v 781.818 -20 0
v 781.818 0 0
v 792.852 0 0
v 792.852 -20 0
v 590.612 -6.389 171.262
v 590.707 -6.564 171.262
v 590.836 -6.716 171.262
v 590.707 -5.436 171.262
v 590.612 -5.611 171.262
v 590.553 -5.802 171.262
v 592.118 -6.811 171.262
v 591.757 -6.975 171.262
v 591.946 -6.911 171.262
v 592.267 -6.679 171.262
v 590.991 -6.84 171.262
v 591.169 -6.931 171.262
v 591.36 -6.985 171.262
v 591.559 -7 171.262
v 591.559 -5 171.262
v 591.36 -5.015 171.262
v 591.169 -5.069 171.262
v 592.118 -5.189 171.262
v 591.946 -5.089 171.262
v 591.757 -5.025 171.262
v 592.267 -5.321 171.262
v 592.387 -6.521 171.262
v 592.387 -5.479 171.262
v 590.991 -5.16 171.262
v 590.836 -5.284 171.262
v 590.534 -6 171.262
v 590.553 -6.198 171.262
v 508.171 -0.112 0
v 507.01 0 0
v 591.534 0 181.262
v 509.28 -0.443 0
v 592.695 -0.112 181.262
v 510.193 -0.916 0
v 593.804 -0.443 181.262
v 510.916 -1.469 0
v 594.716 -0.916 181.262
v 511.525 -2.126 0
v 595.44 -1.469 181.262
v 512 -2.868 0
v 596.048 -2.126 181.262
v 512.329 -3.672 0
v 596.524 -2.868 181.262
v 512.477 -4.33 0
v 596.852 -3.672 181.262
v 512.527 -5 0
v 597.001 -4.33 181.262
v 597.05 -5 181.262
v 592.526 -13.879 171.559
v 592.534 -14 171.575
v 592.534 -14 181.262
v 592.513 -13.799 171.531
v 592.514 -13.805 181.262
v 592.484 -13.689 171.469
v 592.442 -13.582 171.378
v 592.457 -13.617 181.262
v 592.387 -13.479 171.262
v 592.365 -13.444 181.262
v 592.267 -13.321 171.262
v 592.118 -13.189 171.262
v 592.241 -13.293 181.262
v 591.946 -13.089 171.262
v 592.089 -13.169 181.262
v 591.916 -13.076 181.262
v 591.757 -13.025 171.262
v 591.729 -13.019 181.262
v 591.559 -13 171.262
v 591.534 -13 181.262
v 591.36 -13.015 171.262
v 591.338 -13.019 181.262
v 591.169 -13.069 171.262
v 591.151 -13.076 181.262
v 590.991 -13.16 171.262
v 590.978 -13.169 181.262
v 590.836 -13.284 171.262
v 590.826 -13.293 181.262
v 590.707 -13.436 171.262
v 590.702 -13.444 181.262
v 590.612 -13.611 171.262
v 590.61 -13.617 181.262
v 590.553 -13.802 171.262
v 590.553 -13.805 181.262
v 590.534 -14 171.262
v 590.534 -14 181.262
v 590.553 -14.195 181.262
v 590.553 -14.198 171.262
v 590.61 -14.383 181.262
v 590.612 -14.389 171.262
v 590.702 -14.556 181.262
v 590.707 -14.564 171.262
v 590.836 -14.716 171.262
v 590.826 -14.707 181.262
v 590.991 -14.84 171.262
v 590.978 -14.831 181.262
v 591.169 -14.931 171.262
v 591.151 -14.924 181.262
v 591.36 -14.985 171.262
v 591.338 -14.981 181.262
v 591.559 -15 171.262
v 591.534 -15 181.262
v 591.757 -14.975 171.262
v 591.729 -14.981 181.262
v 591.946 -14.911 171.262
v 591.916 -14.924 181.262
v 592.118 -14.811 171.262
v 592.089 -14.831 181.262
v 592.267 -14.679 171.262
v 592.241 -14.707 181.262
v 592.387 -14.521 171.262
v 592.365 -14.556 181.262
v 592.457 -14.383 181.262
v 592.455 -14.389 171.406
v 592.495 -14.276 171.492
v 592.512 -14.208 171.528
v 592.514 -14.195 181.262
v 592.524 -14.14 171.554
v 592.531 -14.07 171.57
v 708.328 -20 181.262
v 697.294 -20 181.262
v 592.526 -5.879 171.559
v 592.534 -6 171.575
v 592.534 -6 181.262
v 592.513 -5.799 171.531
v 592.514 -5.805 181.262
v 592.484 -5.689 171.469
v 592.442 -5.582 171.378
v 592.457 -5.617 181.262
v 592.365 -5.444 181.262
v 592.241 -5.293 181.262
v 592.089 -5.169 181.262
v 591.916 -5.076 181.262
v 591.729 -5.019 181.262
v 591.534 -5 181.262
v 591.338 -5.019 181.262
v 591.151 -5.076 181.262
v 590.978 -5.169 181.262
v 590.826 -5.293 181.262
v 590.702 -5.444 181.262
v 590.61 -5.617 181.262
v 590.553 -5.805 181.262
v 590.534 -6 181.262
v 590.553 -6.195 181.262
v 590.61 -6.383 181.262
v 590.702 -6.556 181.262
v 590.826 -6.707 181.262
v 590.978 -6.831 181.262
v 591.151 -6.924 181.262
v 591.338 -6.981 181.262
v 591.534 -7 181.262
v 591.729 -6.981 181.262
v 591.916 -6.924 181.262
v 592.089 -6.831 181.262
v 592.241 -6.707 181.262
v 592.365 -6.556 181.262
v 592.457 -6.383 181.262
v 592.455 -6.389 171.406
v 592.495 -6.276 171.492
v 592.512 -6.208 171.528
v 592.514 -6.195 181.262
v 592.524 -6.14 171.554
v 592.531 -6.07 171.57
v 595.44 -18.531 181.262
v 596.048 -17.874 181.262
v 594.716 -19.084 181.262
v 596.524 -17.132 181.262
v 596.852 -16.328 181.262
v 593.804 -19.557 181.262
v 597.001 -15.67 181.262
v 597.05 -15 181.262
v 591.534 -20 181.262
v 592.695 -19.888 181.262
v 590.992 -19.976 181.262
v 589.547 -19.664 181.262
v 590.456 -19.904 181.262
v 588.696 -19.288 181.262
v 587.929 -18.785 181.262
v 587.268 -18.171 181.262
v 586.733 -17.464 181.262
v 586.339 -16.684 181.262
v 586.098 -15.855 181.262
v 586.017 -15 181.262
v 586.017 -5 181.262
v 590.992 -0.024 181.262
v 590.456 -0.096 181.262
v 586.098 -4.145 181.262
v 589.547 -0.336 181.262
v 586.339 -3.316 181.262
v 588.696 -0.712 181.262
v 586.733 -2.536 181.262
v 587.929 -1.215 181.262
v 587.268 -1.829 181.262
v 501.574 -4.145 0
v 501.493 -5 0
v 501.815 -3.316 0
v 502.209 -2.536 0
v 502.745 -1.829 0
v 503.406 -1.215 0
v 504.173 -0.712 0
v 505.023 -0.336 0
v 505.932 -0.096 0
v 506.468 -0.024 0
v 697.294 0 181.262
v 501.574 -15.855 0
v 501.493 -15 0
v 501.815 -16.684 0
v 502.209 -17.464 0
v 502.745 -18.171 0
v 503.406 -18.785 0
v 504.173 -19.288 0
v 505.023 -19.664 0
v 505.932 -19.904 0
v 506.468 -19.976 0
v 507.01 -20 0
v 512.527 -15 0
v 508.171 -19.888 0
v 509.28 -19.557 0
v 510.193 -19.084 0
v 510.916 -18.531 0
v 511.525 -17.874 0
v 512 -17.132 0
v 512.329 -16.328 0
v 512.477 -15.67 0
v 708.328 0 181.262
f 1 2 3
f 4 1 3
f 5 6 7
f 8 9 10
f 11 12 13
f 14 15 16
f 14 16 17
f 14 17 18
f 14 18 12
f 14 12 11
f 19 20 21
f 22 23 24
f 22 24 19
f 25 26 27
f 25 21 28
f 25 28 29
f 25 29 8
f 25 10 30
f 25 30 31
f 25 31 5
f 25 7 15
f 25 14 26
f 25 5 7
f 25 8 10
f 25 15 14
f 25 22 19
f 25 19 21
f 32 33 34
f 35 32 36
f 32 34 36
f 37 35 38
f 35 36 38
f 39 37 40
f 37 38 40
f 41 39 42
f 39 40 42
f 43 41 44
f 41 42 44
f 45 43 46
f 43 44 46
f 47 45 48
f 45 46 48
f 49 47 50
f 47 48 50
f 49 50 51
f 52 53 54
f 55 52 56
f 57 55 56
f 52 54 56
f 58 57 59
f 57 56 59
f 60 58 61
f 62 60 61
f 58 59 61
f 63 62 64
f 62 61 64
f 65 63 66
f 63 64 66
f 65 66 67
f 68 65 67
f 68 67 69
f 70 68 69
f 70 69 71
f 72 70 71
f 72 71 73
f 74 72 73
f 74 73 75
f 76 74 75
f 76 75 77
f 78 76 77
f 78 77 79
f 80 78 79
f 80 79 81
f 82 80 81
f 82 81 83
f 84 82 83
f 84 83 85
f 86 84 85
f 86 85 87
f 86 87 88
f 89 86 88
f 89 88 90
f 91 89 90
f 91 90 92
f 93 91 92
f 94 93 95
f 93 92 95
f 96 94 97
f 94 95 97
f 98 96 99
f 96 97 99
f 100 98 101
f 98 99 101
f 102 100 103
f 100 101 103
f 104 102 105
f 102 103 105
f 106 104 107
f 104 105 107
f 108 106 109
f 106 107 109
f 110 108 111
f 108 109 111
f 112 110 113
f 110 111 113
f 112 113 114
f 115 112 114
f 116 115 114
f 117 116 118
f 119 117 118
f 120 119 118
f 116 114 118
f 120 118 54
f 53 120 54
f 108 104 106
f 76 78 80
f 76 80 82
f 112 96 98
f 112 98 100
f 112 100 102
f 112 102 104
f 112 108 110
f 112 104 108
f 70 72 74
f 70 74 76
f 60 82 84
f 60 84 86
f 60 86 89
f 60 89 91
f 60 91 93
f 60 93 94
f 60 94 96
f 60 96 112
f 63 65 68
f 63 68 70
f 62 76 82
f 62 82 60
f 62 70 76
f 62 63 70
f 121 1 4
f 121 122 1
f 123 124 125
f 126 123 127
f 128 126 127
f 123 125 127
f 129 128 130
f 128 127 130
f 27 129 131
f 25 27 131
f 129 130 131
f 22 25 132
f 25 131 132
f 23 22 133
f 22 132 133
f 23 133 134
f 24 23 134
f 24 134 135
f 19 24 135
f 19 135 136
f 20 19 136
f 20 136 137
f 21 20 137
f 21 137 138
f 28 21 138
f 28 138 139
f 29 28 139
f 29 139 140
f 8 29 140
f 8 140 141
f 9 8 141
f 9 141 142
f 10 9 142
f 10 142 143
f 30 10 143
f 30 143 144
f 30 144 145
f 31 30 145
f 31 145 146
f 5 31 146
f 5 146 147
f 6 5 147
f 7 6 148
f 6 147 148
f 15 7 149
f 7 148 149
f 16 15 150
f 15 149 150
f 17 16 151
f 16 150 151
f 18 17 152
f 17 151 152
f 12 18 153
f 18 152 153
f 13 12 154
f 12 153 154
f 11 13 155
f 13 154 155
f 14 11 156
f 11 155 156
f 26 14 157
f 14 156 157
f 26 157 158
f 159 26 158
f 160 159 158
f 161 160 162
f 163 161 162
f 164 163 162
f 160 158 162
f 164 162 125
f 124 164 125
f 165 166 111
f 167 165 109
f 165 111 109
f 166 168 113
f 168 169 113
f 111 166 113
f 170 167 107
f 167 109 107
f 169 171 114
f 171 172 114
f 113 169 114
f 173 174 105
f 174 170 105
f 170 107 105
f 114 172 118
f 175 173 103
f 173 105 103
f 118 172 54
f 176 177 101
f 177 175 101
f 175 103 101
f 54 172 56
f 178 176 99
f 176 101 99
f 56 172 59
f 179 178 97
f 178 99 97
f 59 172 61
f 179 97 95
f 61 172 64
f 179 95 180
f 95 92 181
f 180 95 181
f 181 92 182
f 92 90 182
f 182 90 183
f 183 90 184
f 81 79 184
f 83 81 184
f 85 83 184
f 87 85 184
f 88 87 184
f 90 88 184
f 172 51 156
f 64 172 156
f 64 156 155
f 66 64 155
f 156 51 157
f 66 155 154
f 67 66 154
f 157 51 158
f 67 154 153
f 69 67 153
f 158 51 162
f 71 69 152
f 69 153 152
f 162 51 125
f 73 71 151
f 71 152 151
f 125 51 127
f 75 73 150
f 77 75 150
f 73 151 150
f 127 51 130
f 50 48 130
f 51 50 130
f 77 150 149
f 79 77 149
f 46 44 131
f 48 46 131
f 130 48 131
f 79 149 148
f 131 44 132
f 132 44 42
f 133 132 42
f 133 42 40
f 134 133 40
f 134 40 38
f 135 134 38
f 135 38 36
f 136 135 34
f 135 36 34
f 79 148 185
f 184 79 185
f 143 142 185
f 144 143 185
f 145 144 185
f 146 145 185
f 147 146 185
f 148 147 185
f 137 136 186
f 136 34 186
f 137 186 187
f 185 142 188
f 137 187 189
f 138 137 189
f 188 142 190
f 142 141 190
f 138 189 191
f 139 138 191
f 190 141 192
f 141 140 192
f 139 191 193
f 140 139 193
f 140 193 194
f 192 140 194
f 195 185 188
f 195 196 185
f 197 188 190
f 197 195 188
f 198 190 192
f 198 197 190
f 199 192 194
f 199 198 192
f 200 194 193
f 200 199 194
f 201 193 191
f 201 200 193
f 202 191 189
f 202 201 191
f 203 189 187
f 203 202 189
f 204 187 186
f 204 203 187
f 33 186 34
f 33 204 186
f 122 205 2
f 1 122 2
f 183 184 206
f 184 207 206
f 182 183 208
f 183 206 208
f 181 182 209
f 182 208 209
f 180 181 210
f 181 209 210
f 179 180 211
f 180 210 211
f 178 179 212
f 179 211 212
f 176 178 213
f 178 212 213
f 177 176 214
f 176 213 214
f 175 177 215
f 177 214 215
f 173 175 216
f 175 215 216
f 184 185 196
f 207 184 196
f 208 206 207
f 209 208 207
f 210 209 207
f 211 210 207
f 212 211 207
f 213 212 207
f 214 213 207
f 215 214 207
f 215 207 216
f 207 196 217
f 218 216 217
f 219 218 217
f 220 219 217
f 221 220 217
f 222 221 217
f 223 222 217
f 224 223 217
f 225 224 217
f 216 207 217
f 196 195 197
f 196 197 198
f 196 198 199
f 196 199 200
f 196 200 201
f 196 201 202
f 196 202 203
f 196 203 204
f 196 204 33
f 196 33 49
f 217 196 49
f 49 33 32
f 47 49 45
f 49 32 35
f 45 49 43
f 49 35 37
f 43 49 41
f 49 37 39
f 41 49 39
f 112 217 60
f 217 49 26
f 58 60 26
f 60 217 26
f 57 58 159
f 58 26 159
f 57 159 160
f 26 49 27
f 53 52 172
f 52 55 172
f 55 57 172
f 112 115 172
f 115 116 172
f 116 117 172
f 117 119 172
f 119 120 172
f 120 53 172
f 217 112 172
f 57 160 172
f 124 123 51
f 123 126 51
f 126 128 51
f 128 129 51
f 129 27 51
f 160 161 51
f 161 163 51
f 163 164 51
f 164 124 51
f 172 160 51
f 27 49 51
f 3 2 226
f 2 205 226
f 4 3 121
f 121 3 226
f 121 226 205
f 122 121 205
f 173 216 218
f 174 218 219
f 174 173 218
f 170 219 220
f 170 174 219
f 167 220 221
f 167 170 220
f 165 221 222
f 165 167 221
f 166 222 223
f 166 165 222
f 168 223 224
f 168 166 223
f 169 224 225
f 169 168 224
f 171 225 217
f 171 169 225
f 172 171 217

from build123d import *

# Parameters (mm, degrees)
F1_DEPTH = 20
F2_R     = 1
F3_DEPTH = 10
F4_R     = 4.99999


# Not quite as in the source:
# - a fillet or chamfer is up to 0.001 mm smaller than in the source, because OpenCascade refuses the exact size


with BuildPart() as f1:
    # F0 (on Front) → F1 (new body)
    with BuildSketch(Plane.XZ):
        Polygon((586.0166443916, 181.2615574073), (501.4929920435, 0), (512.5267712331, 0), (597.0504235813, 181.2615574073), align=None)
    extrude(amount=F1_DEPTH)

    # F2 (on face) → F3 (cut)
    with BuildSketch(Plane.XY.offset(181.2615574073)):
        with Locations((591.5335339864, -6)):
            Circle(F2_R)
        with Locations((591.5335339864, -14)):
            Circle(F2_R)
    extrude(amount=-F3_DEPTH, mode=Mode.SUBTRACT)

    # F4 (radius 5 in the source; OpenCascade refuses exactly that, so slightly less here)
    f4_edges = [f1.edges().sort_by_distance(p)[0] for p in [
        (543.754818, -20, 90.630779),
        (543.754818, 0, 90.630779),
        (554.788597, -20, 90.630779),
        (554.788597, 0, 90.630779),
    ]]
    fillet(f4_edges, radius=F4_R)


with BuildPart() as f1b:
    # F0 (on Front) → F1, piece 2 (new body)
    with BuildSketch(Plane.XZ):
        Polygon((781.8177731776, 0), (792.8515523672, 0), (708.3279000191, 181.2615574073), (697.2941208294, 181.2615574073), align=None)
    extrude(amount=F1_DEPTH)


solid = Compound([f1.part, f1b.part])
